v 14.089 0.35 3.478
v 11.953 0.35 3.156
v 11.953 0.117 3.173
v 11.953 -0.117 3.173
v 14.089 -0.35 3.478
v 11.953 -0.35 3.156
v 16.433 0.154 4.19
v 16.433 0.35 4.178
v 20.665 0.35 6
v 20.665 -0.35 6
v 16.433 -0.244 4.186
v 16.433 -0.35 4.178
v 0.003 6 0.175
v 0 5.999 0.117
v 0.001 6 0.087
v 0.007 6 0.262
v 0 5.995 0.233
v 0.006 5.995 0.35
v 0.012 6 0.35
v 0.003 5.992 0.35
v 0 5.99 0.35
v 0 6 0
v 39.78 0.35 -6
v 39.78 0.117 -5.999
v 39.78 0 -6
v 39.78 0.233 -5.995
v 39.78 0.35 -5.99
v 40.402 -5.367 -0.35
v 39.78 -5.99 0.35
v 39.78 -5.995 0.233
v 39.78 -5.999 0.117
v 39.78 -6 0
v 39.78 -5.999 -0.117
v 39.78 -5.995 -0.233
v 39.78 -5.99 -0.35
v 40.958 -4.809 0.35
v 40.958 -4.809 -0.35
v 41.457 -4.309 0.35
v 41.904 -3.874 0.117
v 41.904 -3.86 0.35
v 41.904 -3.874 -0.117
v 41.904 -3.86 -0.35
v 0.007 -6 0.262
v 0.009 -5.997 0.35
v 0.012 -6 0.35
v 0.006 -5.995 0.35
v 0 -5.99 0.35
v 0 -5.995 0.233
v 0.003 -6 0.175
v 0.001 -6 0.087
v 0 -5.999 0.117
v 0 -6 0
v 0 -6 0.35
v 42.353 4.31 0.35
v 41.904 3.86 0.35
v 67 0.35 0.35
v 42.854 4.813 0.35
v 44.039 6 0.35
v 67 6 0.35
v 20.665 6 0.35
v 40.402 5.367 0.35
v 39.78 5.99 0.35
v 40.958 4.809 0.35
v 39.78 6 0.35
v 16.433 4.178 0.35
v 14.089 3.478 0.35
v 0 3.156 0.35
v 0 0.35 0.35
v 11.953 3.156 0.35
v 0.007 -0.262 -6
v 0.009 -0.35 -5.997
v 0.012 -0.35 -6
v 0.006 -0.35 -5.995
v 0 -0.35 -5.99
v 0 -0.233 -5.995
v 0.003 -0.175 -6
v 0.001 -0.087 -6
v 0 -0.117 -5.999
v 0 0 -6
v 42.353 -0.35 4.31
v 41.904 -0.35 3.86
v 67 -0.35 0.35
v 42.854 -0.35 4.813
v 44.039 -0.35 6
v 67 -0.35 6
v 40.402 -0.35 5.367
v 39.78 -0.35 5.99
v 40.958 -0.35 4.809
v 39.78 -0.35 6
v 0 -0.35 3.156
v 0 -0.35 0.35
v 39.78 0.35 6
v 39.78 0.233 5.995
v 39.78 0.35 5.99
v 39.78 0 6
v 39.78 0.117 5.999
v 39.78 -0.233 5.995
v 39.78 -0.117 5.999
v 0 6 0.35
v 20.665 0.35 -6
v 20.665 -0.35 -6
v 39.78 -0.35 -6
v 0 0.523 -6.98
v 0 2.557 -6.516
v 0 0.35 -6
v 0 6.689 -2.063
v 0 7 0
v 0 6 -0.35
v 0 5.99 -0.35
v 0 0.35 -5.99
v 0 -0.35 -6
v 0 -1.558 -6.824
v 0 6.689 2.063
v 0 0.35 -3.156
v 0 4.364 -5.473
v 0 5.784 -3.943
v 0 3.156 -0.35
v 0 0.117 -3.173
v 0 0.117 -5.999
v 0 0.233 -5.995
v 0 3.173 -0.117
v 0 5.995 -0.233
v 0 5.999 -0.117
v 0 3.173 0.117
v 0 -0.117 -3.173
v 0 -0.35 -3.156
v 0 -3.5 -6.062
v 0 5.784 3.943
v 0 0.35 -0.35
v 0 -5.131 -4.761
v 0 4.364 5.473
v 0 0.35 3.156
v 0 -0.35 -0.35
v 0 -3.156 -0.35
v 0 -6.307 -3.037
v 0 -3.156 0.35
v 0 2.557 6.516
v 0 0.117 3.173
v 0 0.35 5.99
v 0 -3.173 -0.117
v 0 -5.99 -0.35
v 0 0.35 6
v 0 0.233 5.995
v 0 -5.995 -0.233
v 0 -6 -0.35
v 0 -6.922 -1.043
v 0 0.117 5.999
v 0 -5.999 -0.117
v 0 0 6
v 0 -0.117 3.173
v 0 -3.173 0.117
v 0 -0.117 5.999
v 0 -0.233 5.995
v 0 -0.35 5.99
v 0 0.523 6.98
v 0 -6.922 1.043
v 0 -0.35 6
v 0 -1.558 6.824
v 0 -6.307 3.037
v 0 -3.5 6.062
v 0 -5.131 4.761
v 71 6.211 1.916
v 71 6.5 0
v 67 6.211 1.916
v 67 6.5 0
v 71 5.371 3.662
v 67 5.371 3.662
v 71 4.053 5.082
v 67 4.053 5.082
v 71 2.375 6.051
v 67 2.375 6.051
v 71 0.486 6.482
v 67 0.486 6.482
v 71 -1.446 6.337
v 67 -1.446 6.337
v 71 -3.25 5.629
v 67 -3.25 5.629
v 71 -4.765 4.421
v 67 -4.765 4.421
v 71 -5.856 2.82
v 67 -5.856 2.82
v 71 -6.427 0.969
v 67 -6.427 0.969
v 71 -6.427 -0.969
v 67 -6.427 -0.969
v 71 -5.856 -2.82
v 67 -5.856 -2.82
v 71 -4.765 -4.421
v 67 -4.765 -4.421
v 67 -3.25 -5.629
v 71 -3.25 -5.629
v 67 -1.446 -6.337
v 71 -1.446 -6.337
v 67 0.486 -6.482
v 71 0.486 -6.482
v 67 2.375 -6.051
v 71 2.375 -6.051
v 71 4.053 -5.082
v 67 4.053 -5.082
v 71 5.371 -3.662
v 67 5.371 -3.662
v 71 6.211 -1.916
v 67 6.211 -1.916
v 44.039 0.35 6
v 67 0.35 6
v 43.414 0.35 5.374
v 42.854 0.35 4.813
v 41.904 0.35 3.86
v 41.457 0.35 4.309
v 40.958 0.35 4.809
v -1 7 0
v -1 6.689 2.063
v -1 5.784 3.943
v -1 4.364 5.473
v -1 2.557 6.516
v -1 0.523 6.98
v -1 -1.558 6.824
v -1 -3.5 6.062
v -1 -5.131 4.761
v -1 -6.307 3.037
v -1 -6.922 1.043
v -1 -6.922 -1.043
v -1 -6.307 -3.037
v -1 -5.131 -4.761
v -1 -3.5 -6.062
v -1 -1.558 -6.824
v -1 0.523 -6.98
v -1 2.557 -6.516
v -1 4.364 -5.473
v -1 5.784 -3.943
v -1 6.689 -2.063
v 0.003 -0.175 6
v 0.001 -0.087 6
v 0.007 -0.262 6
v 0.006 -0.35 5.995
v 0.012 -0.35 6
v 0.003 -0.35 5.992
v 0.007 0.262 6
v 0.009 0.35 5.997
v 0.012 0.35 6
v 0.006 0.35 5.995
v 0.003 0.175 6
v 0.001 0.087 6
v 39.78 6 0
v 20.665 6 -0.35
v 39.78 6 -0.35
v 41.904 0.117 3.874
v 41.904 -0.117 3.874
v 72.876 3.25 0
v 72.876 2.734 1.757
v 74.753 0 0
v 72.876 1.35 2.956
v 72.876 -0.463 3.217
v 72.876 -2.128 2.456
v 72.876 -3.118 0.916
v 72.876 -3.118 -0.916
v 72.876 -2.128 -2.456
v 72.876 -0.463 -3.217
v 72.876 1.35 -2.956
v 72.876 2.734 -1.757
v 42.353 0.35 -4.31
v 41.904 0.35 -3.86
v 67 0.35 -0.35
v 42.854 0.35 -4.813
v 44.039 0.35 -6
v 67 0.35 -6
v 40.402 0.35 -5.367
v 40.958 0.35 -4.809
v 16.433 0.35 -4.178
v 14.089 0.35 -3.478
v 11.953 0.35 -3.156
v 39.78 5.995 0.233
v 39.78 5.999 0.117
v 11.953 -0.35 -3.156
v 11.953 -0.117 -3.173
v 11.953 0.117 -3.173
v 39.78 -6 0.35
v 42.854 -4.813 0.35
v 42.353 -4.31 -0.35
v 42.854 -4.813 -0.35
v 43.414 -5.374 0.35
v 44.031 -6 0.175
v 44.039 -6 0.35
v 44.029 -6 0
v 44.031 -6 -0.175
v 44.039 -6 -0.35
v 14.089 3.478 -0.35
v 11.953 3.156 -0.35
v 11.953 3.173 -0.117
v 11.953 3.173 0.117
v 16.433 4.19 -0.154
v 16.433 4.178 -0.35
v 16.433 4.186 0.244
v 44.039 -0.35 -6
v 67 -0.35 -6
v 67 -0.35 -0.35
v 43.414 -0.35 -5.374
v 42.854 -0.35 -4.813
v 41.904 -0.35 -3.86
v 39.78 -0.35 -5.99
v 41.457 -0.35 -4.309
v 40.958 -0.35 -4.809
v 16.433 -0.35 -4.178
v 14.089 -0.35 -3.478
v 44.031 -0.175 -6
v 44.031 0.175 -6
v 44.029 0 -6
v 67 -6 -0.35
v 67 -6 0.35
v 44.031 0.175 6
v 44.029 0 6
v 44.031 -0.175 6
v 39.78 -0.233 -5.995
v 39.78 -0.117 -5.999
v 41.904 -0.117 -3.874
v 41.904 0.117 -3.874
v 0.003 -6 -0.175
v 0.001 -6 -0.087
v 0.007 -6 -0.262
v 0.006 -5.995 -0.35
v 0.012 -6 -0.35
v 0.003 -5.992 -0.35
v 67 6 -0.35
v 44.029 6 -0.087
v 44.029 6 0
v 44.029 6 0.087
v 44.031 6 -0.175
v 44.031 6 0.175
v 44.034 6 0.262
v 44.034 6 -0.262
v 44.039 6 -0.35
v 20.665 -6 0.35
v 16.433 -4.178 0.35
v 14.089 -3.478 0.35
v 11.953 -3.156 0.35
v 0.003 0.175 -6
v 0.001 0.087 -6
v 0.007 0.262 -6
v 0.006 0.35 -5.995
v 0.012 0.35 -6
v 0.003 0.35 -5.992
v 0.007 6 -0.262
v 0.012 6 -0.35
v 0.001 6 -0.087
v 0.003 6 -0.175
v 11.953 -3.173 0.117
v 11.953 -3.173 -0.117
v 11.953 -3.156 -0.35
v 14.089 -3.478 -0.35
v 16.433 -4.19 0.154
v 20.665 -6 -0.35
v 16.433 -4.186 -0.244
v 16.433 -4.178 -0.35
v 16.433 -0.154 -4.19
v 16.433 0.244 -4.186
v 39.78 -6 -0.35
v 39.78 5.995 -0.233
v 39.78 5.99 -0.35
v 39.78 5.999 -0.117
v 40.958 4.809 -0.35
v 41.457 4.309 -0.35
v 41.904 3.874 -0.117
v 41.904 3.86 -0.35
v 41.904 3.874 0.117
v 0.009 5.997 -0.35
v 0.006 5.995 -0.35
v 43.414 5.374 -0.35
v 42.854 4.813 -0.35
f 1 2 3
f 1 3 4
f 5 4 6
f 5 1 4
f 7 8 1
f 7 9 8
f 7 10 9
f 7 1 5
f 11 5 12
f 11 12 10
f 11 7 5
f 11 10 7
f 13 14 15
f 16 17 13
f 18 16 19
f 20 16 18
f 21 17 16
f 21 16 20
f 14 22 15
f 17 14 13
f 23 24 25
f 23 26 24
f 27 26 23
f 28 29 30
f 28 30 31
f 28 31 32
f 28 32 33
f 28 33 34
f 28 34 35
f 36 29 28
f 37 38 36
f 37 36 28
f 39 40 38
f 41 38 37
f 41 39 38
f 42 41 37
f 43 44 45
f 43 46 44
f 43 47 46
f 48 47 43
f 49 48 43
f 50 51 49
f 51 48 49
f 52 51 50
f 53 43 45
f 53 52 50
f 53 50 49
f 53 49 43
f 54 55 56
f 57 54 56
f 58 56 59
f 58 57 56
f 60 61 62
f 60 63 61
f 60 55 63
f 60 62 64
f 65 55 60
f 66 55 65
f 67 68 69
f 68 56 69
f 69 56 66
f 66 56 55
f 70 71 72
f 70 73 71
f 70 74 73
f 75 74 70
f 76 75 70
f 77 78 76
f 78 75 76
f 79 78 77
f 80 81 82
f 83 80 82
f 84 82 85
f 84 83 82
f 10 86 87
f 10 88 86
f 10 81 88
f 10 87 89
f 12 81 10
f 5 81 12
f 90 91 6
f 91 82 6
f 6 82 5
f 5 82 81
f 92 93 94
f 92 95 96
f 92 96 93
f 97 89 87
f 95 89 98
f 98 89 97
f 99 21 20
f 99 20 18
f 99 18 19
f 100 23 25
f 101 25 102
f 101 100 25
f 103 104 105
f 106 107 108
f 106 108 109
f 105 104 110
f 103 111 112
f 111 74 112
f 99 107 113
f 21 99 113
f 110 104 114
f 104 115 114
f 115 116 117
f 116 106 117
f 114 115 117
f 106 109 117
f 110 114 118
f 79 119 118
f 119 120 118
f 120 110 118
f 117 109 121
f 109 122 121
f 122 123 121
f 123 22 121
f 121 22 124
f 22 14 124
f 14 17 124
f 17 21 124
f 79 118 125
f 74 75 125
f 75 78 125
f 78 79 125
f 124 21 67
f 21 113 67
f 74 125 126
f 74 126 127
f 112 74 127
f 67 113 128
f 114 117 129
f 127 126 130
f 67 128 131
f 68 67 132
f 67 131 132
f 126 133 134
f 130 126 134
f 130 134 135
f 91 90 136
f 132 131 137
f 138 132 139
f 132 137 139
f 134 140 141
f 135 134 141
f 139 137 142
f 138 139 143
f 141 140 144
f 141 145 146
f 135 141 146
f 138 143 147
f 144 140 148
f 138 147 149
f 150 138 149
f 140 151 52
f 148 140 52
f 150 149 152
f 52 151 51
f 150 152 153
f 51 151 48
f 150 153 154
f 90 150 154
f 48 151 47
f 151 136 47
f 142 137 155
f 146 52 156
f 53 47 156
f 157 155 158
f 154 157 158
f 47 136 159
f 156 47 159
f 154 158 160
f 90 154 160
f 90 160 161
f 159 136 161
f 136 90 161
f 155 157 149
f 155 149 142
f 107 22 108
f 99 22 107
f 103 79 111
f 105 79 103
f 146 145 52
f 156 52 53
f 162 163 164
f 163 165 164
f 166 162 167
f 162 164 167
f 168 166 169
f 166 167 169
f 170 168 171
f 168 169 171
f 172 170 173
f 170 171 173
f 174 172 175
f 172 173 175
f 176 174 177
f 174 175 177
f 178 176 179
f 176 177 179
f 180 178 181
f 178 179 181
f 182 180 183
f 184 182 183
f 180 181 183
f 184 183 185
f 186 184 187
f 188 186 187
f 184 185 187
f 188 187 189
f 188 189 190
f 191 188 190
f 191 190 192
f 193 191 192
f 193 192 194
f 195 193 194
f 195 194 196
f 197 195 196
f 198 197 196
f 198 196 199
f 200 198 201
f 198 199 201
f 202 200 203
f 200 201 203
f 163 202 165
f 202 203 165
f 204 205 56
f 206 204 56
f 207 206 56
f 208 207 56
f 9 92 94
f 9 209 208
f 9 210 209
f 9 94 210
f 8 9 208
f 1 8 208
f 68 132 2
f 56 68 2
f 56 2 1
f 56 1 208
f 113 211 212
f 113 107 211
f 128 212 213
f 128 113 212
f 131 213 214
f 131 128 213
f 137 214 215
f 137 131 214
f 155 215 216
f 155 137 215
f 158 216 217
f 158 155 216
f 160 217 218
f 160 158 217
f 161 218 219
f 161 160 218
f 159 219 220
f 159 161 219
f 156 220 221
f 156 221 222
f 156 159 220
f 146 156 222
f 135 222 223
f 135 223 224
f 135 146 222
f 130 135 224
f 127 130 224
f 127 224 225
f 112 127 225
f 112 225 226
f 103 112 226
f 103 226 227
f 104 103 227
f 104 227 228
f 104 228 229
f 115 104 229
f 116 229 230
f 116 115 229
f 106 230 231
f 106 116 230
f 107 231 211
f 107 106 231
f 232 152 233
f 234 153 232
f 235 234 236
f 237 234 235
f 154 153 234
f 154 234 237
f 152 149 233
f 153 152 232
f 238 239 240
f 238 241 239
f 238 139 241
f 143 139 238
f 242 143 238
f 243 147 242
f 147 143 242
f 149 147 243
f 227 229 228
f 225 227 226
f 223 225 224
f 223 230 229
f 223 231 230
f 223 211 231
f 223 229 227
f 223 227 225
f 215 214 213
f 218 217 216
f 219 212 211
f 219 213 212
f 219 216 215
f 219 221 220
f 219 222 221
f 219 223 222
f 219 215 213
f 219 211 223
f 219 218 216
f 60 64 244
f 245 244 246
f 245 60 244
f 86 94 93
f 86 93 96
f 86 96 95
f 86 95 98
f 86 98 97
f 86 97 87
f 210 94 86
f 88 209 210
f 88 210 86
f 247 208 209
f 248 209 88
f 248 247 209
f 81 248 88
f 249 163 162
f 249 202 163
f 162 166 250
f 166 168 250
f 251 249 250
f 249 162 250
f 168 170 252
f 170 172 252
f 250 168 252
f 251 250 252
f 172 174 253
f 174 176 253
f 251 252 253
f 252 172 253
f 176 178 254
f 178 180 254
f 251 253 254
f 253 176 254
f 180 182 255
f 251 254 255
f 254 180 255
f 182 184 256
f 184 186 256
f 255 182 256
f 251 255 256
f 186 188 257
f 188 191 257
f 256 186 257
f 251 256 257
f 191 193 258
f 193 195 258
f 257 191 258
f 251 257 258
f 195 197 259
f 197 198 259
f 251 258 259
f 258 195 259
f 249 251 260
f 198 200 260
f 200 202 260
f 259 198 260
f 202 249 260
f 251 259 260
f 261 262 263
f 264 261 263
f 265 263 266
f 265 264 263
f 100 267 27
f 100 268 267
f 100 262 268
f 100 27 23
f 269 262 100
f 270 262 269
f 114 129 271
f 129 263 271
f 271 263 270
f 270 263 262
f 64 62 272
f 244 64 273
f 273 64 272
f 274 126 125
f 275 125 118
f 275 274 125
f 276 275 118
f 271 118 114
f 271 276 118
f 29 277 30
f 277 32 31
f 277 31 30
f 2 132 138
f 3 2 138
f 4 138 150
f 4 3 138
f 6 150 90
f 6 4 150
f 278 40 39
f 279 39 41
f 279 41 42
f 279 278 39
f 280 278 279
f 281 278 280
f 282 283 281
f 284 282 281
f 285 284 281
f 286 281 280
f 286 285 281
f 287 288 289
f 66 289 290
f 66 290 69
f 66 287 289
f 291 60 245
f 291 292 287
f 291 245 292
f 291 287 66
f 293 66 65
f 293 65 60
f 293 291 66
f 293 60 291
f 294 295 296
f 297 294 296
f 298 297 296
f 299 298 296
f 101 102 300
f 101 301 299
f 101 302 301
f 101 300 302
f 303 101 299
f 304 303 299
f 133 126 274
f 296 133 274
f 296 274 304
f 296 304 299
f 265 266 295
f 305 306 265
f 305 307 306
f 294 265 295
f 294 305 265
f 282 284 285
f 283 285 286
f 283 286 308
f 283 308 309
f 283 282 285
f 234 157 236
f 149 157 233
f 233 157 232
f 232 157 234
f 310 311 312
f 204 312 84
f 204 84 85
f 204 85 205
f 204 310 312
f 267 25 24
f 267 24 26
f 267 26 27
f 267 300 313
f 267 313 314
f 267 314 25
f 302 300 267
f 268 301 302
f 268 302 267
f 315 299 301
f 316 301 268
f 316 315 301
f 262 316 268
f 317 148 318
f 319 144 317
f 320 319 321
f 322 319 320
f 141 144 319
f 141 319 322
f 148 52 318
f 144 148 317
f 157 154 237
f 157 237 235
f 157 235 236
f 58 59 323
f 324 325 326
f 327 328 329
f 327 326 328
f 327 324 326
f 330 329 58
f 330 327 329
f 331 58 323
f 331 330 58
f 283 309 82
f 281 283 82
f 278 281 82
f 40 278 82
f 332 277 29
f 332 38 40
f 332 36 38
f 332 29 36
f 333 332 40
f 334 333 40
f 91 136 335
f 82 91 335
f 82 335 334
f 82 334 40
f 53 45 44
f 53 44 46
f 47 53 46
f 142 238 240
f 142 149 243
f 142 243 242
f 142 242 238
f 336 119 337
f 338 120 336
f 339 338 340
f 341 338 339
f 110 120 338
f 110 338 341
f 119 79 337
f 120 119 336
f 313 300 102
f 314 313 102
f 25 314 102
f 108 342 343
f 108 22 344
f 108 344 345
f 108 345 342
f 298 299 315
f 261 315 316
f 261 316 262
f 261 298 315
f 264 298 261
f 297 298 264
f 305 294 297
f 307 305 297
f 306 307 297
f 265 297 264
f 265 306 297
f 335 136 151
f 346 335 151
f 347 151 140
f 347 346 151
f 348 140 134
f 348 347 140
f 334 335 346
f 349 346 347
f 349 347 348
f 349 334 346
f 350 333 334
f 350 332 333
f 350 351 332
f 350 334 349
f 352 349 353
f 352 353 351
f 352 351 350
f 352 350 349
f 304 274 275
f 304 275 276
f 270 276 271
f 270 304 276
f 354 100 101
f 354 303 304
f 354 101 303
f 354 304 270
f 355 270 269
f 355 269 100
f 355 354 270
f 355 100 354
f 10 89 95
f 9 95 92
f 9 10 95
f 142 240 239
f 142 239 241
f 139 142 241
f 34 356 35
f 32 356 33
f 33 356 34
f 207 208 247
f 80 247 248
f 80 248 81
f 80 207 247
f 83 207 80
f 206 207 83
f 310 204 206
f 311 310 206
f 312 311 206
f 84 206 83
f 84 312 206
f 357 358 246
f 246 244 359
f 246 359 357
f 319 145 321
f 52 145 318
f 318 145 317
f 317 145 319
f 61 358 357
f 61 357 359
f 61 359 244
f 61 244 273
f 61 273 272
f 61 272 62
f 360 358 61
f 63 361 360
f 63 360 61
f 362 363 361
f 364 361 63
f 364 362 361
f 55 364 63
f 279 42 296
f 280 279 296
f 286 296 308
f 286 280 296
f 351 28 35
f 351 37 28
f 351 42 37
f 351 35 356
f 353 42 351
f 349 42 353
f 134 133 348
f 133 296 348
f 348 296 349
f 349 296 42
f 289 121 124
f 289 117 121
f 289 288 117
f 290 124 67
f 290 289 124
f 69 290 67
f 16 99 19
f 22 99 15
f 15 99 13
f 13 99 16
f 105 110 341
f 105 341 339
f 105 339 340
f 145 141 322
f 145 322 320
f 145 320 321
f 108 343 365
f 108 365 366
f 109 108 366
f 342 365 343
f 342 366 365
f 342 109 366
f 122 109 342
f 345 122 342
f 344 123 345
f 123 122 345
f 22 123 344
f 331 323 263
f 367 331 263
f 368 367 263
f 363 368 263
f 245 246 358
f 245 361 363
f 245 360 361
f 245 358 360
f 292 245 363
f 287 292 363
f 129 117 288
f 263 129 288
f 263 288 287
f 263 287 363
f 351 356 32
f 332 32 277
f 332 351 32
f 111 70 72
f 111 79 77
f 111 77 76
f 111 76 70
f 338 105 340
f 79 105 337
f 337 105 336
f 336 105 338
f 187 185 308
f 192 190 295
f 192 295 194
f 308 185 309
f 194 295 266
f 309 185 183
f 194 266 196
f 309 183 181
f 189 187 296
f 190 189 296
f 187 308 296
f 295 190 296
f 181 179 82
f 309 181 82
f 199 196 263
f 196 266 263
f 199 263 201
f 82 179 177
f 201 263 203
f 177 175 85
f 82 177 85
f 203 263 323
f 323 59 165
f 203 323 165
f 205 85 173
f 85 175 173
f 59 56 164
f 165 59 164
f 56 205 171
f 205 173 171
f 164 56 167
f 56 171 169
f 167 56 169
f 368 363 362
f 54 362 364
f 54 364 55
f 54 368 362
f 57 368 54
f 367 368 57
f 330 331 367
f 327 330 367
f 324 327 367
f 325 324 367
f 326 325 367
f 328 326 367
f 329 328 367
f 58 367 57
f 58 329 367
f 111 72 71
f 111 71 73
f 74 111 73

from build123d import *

# Parameters (mm, degrees)
EXTRUDE_1_DEPTH = 67
SKETCH_3_W      = 1
SKETCH_3_H      = 7


with BuildPart() as part:
    # Эскиз1 → Бобышка-Вытянуть1 (new body)
    with BuildSketch(Plane(origin=(0, 0, 0), x_dir=(0, 0, -1), z_dir=(1, 0, 0))):
        Polygon((-6, 0.35), (-0.35, 0.35), (-0.35, 6), (0.35, 6), (0.35, 0.35), (6, 0.35), (6, -0.35), (0.35, -0.35), (0.35, -6), (-0.35, -6), (-0.35, -0.35), (-6, -0.35), align=None)
    extrude(amount=EXTRUDE_1_DEPTH)

    # Эскиз3 → Повернуть1 (revolve)
    with BuildSketch(Plane.XY):
        Polygon((74.75277675, 0), (71, 6.5), (67, 6.5), (67, 0), align=None)
        with Locations((-0.5, 3.5)):
            Rectangle(SKETCH_3_W, SKETCH_3_H)
    revolve(axis=Axis((0, 0, 0), (1, 0, 0)))

    # Эскиз4 → Вырез-Повернуть1 (revolve, cut)
    with BuildSketch(Plane.XY):
        with BuildLine():
            Line((0, 6), (0, 3.175))
            Line((0, 3.175), (11.953250745, 3.175))
            add(Edge.make_bspline(
                [(11.953250745, 3.175), (13.82559534, 3.302015048), (23.044496857, 6.133590622), (30.696517759, 12.611861304), (39.780139318, 8.557592838)],
                knots=[0, 0, 0, 0, 0.195436417, 1, 1, 1, 1], degree=3))
            Line((39.780139318, 8.557592838), (39.780139318, 6))
            Line((39.780139318, 6), (41.904336104, 3.875803214))
            Line((41.904336104, 3.875803214), (45.076323965, 7.047791075))
            Line((45.076323965, 7.047791075), (24.996442716, 20.783696601))
            Line((24.996442716, 20.783696601), (10.913533525, 15.605616348))
            Line((10.913533525, 15.605616348), (0, 6))
        make_face()
    revolve(axis=Axis((0, 0, 0), (1, 0, 0)), mode=Mode.SUBTRACT)


solid = part.part
